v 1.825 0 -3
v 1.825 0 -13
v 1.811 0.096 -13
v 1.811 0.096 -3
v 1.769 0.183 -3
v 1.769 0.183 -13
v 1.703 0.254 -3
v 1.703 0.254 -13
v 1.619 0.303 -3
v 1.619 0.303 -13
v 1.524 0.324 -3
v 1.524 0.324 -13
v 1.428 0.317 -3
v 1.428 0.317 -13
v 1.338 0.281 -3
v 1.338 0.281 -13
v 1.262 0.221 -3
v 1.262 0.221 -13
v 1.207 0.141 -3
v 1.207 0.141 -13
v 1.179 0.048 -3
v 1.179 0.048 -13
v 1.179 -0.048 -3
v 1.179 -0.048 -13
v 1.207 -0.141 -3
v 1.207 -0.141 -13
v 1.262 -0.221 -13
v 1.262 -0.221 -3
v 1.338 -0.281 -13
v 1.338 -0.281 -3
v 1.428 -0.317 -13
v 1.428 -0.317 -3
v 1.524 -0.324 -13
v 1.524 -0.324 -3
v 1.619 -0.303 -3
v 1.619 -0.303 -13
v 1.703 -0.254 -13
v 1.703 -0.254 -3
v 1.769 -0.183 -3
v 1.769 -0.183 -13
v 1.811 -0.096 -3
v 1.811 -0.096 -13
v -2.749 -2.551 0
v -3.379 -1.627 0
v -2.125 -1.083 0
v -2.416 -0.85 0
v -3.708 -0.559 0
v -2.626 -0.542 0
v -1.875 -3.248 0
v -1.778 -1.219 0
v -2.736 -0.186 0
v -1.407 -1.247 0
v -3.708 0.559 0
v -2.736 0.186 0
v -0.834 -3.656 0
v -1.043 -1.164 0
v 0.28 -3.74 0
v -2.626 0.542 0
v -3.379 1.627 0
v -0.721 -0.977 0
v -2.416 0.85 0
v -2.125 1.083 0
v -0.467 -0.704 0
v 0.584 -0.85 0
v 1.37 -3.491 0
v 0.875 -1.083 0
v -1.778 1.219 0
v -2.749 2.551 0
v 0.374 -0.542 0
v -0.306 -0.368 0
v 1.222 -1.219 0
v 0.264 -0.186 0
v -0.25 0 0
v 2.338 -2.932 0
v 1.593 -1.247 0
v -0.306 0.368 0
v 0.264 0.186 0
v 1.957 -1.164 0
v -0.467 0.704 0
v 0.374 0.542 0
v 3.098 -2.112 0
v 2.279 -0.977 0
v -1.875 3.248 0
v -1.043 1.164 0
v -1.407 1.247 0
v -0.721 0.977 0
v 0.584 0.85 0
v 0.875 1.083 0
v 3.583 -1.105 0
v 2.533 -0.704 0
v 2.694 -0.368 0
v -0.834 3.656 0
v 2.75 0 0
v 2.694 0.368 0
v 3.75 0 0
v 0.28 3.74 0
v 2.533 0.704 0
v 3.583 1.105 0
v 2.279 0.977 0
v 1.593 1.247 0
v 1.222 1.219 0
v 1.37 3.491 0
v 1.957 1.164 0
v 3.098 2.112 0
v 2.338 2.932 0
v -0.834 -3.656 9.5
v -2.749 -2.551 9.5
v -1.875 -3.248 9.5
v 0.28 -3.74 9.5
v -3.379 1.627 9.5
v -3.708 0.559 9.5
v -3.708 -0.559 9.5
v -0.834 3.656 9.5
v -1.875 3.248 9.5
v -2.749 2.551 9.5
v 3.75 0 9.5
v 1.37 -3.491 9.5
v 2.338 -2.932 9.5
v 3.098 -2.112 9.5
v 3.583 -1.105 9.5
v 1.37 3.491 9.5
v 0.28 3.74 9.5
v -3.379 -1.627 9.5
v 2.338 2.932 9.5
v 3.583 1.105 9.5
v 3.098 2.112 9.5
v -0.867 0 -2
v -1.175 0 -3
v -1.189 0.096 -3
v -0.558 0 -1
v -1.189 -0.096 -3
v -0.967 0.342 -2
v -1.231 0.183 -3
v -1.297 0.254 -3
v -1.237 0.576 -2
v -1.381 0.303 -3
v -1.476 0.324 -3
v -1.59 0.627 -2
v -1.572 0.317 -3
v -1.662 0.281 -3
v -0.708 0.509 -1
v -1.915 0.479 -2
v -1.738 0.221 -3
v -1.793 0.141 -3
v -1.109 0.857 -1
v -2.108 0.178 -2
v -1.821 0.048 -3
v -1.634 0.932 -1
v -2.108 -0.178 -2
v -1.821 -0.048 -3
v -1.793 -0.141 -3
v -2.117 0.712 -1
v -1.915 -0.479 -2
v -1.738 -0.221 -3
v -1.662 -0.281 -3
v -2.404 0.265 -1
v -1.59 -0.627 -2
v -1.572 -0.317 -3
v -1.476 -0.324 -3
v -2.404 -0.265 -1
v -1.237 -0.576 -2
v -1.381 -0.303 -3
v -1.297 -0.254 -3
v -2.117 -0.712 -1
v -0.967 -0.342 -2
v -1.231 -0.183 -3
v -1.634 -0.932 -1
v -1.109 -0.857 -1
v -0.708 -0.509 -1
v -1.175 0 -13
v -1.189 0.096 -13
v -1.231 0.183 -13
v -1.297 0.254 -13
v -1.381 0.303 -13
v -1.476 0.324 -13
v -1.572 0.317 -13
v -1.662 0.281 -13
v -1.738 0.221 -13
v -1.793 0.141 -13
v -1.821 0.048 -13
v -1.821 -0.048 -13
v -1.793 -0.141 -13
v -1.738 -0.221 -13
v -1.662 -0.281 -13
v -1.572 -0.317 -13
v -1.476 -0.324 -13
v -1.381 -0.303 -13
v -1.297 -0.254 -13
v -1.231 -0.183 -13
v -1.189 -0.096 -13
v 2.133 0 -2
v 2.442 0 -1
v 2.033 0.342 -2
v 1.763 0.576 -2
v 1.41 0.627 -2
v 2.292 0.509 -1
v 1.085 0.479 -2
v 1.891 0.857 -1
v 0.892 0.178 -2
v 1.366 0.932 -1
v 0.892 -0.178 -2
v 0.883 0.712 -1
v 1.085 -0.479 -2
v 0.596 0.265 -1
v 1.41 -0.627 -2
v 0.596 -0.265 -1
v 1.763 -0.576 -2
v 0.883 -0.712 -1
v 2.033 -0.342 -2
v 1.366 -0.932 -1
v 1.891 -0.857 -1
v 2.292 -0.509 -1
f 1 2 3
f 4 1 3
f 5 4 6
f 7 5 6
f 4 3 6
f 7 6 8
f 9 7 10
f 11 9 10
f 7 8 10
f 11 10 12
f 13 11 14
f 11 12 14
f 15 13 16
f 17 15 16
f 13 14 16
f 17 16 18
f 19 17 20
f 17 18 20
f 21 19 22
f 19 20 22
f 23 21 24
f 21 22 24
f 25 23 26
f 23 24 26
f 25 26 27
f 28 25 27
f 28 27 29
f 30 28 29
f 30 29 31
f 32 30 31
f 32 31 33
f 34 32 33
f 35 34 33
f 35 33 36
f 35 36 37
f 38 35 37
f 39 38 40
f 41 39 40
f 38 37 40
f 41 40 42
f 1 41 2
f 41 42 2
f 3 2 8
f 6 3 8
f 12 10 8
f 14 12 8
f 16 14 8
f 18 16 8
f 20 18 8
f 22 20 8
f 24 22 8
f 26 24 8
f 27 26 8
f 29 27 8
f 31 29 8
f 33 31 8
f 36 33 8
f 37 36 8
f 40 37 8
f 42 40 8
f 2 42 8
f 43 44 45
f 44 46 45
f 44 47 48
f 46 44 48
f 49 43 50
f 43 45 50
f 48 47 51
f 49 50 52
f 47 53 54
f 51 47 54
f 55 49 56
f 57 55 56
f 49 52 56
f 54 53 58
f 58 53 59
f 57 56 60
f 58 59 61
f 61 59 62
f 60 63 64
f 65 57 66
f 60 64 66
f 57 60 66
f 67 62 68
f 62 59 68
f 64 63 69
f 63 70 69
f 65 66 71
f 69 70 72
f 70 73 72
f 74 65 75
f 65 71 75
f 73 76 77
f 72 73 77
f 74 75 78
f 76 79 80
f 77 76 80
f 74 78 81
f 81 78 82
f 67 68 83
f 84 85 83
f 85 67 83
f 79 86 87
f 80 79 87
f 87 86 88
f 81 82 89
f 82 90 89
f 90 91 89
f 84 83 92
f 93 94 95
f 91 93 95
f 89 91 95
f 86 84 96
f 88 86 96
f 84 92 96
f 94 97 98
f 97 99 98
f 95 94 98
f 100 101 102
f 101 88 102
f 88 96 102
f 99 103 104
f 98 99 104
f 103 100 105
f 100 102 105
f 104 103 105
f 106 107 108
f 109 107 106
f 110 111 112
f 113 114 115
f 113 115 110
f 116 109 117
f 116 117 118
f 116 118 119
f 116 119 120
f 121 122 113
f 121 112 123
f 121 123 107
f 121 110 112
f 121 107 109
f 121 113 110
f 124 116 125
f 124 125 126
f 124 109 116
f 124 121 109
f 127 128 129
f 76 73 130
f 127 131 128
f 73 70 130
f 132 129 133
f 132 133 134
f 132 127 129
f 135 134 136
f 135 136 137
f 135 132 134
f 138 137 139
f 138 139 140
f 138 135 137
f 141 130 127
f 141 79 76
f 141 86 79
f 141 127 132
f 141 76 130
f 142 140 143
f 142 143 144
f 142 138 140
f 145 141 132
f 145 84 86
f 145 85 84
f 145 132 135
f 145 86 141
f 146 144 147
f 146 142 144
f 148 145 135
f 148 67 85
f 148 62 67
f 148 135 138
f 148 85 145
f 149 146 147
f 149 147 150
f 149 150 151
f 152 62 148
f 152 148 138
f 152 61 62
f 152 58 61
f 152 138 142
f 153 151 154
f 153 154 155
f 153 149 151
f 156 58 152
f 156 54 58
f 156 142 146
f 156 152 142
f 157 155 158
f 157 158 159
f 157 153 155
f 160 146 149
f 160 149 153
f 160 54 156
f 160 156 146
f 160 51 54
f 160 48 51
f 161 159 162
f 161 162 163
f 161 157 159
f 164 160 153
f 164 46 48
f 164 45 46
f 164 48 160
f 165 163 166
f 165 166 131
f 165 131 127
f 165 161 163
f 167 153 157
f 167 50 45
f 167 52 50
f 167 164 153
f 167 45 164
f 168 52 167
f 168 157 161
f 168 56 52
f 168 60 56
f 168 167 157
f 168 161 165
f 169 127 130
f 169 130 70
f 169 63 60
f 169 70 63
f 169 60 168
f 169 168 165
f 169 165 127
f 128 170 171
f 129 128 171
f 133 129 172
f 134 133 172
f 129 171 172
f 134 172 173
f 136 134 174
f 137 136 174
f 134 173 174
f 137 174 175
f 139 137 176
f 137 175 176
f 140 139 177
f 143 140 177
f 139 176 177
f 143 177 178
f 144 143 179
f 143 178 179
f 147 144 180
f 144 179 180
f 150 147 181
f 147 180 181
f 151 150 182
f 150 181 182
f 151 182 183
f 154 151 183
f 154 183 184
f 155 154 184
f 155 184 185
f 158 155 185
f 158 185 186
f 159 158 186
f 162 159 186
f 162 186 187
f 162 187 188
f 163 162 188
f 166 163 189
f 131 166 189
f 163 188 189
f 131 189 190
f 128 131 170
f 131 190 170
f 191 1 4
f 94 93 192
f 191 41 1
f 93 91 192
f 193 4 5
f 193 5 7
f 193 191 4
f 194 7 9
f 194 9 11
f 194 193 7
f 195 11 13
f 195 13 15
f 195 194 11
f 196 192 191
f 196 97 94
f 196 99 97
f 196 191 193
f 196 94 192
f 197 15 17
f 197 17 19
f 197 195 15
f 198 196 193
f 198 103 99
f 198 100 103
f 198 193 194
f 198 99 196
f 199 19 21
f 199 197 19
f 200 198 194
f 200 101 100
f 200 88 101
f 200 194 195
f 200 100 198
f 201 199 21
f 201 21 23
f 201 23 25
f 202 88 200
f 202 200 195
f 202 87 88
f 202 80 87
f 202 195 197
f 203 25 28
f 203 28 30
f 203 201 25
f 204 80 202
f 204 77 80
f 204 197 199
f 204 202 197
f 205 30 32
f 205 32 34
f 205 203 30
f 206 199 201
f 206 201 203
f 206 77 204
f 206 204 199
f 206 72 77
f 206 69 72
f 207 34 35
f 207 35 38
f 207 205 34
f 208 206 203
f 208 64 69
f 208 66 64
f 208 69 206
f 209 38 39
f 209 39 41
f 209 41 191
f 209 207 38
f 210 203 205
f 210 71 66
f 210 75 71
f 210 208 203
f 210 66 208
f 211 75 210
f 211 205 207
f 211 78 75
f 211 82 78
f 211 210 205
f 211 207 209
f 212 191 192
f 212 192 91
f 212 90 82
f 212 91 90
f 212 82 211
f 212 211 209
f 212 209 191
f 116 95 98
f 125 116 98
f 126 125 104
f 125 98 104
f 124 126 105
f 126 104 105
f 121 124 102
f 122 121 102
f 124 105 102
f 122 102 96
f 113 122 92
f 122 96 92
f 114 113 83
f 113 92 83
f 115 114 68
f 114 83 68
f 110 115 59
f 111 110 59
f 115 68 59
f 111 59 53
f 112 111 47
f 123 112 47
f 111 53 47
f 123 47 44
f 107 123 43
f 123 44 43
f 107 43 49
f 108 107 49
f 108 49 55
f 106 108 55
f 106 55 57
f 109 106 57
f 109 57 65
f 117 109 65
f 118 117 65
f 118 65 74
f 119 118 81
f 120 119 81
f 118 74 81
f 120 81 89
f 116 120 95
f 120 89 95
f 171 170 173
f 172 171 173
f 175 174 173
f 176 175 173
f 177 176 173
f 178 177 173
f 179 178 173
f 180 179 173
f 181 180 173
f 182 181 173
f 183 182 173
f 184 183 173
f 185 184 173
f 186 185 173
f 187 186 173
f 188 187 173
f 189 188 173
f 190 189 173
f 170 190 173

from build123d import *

# Parameters (mm, degrees)
CYLINDER001_R     = 0.325
CYLINDER001_DEPTH = 10
CYLINDER002_R     = 0.325
CYLINDER002_DEPTH = 10
CYLINDER_R        = 3.75
CYLINDER_DEPTH    = 9.5


with BuildPart() as henger001:
    # Cylinder001 → Cylinder001 (new body)
    with BuildSketch(Plane(origin=(-9, 0, -10), x_dir=(1, 0, 0), z_dir=(0, 0, 1))):
        Circle(CYLINDER001_R)
    extrude(amount=CYLINDER001_DEPTH)


with BuildPart() as fusion:
    # Cone → Cone (revolve)
    with BuildSketch(Plane(origin=(-9, 0, 0), x_dir=(1, 0, 0), z_dir=(0, -1, 0))):
        Polygon((0, 0), (0.325, 0), (1.25, 3), (0, 3), align=None)
    revolve(axis=Axis((-9, 0, 0), (0, 0, 1)))

    # Fusion: union Henger001
    add(henger001.part)


with BuildPart() as fusion_1:
    # Fusion placement: moved
    add(fusion.part.moved(Location((10.5, 0, -3))))


with BuildPart() as henger002:
    # Cylinder002 → Cylinder002 (new body)
    with BuildSketch(Plane(origin=(-9, 0, -10), x_dir=(1, 0, 0), z_dir=(0, 0, 1))):
        Circle(CYLINDER002_R)
    extrude(amount=CYLINDER002_DEPTH)


with BuildPart() as fusion001:
    # Cone001 → Cone001 (revolve)
    with BuildSketch(Plane(origin=(-9, 0, 0), x_dir=(1, 0, 0), z_dir=(0, -1, 0))):
        Polygon((0, 0), (0.325, 0), (1.25, 3), (0, 3), align=None)
    revolve(axis=Axis((-9, 0, 0), (0, 0, 1)))

    # Fusion001: union Henger002
    add(henger002.part)


with BuildPart() as fusion001_1:
    # Fusion001 placement: moved
    add(fusion001.part.moved(Location((7.5, 0, -3))))


with BuildPart() as fusion002:
    # Cylinder → Cylinder (new body)
    with BuildSketch(Plane.XY):
        Circle(CYLINDER_R)
    extrude(amount=CYLINDER_DEPTH)

    # Fusion002: union Fusion, Fusion001
    add(fusion_1.part)
    add(fusion001_1.part)


solid = fusion002.part
